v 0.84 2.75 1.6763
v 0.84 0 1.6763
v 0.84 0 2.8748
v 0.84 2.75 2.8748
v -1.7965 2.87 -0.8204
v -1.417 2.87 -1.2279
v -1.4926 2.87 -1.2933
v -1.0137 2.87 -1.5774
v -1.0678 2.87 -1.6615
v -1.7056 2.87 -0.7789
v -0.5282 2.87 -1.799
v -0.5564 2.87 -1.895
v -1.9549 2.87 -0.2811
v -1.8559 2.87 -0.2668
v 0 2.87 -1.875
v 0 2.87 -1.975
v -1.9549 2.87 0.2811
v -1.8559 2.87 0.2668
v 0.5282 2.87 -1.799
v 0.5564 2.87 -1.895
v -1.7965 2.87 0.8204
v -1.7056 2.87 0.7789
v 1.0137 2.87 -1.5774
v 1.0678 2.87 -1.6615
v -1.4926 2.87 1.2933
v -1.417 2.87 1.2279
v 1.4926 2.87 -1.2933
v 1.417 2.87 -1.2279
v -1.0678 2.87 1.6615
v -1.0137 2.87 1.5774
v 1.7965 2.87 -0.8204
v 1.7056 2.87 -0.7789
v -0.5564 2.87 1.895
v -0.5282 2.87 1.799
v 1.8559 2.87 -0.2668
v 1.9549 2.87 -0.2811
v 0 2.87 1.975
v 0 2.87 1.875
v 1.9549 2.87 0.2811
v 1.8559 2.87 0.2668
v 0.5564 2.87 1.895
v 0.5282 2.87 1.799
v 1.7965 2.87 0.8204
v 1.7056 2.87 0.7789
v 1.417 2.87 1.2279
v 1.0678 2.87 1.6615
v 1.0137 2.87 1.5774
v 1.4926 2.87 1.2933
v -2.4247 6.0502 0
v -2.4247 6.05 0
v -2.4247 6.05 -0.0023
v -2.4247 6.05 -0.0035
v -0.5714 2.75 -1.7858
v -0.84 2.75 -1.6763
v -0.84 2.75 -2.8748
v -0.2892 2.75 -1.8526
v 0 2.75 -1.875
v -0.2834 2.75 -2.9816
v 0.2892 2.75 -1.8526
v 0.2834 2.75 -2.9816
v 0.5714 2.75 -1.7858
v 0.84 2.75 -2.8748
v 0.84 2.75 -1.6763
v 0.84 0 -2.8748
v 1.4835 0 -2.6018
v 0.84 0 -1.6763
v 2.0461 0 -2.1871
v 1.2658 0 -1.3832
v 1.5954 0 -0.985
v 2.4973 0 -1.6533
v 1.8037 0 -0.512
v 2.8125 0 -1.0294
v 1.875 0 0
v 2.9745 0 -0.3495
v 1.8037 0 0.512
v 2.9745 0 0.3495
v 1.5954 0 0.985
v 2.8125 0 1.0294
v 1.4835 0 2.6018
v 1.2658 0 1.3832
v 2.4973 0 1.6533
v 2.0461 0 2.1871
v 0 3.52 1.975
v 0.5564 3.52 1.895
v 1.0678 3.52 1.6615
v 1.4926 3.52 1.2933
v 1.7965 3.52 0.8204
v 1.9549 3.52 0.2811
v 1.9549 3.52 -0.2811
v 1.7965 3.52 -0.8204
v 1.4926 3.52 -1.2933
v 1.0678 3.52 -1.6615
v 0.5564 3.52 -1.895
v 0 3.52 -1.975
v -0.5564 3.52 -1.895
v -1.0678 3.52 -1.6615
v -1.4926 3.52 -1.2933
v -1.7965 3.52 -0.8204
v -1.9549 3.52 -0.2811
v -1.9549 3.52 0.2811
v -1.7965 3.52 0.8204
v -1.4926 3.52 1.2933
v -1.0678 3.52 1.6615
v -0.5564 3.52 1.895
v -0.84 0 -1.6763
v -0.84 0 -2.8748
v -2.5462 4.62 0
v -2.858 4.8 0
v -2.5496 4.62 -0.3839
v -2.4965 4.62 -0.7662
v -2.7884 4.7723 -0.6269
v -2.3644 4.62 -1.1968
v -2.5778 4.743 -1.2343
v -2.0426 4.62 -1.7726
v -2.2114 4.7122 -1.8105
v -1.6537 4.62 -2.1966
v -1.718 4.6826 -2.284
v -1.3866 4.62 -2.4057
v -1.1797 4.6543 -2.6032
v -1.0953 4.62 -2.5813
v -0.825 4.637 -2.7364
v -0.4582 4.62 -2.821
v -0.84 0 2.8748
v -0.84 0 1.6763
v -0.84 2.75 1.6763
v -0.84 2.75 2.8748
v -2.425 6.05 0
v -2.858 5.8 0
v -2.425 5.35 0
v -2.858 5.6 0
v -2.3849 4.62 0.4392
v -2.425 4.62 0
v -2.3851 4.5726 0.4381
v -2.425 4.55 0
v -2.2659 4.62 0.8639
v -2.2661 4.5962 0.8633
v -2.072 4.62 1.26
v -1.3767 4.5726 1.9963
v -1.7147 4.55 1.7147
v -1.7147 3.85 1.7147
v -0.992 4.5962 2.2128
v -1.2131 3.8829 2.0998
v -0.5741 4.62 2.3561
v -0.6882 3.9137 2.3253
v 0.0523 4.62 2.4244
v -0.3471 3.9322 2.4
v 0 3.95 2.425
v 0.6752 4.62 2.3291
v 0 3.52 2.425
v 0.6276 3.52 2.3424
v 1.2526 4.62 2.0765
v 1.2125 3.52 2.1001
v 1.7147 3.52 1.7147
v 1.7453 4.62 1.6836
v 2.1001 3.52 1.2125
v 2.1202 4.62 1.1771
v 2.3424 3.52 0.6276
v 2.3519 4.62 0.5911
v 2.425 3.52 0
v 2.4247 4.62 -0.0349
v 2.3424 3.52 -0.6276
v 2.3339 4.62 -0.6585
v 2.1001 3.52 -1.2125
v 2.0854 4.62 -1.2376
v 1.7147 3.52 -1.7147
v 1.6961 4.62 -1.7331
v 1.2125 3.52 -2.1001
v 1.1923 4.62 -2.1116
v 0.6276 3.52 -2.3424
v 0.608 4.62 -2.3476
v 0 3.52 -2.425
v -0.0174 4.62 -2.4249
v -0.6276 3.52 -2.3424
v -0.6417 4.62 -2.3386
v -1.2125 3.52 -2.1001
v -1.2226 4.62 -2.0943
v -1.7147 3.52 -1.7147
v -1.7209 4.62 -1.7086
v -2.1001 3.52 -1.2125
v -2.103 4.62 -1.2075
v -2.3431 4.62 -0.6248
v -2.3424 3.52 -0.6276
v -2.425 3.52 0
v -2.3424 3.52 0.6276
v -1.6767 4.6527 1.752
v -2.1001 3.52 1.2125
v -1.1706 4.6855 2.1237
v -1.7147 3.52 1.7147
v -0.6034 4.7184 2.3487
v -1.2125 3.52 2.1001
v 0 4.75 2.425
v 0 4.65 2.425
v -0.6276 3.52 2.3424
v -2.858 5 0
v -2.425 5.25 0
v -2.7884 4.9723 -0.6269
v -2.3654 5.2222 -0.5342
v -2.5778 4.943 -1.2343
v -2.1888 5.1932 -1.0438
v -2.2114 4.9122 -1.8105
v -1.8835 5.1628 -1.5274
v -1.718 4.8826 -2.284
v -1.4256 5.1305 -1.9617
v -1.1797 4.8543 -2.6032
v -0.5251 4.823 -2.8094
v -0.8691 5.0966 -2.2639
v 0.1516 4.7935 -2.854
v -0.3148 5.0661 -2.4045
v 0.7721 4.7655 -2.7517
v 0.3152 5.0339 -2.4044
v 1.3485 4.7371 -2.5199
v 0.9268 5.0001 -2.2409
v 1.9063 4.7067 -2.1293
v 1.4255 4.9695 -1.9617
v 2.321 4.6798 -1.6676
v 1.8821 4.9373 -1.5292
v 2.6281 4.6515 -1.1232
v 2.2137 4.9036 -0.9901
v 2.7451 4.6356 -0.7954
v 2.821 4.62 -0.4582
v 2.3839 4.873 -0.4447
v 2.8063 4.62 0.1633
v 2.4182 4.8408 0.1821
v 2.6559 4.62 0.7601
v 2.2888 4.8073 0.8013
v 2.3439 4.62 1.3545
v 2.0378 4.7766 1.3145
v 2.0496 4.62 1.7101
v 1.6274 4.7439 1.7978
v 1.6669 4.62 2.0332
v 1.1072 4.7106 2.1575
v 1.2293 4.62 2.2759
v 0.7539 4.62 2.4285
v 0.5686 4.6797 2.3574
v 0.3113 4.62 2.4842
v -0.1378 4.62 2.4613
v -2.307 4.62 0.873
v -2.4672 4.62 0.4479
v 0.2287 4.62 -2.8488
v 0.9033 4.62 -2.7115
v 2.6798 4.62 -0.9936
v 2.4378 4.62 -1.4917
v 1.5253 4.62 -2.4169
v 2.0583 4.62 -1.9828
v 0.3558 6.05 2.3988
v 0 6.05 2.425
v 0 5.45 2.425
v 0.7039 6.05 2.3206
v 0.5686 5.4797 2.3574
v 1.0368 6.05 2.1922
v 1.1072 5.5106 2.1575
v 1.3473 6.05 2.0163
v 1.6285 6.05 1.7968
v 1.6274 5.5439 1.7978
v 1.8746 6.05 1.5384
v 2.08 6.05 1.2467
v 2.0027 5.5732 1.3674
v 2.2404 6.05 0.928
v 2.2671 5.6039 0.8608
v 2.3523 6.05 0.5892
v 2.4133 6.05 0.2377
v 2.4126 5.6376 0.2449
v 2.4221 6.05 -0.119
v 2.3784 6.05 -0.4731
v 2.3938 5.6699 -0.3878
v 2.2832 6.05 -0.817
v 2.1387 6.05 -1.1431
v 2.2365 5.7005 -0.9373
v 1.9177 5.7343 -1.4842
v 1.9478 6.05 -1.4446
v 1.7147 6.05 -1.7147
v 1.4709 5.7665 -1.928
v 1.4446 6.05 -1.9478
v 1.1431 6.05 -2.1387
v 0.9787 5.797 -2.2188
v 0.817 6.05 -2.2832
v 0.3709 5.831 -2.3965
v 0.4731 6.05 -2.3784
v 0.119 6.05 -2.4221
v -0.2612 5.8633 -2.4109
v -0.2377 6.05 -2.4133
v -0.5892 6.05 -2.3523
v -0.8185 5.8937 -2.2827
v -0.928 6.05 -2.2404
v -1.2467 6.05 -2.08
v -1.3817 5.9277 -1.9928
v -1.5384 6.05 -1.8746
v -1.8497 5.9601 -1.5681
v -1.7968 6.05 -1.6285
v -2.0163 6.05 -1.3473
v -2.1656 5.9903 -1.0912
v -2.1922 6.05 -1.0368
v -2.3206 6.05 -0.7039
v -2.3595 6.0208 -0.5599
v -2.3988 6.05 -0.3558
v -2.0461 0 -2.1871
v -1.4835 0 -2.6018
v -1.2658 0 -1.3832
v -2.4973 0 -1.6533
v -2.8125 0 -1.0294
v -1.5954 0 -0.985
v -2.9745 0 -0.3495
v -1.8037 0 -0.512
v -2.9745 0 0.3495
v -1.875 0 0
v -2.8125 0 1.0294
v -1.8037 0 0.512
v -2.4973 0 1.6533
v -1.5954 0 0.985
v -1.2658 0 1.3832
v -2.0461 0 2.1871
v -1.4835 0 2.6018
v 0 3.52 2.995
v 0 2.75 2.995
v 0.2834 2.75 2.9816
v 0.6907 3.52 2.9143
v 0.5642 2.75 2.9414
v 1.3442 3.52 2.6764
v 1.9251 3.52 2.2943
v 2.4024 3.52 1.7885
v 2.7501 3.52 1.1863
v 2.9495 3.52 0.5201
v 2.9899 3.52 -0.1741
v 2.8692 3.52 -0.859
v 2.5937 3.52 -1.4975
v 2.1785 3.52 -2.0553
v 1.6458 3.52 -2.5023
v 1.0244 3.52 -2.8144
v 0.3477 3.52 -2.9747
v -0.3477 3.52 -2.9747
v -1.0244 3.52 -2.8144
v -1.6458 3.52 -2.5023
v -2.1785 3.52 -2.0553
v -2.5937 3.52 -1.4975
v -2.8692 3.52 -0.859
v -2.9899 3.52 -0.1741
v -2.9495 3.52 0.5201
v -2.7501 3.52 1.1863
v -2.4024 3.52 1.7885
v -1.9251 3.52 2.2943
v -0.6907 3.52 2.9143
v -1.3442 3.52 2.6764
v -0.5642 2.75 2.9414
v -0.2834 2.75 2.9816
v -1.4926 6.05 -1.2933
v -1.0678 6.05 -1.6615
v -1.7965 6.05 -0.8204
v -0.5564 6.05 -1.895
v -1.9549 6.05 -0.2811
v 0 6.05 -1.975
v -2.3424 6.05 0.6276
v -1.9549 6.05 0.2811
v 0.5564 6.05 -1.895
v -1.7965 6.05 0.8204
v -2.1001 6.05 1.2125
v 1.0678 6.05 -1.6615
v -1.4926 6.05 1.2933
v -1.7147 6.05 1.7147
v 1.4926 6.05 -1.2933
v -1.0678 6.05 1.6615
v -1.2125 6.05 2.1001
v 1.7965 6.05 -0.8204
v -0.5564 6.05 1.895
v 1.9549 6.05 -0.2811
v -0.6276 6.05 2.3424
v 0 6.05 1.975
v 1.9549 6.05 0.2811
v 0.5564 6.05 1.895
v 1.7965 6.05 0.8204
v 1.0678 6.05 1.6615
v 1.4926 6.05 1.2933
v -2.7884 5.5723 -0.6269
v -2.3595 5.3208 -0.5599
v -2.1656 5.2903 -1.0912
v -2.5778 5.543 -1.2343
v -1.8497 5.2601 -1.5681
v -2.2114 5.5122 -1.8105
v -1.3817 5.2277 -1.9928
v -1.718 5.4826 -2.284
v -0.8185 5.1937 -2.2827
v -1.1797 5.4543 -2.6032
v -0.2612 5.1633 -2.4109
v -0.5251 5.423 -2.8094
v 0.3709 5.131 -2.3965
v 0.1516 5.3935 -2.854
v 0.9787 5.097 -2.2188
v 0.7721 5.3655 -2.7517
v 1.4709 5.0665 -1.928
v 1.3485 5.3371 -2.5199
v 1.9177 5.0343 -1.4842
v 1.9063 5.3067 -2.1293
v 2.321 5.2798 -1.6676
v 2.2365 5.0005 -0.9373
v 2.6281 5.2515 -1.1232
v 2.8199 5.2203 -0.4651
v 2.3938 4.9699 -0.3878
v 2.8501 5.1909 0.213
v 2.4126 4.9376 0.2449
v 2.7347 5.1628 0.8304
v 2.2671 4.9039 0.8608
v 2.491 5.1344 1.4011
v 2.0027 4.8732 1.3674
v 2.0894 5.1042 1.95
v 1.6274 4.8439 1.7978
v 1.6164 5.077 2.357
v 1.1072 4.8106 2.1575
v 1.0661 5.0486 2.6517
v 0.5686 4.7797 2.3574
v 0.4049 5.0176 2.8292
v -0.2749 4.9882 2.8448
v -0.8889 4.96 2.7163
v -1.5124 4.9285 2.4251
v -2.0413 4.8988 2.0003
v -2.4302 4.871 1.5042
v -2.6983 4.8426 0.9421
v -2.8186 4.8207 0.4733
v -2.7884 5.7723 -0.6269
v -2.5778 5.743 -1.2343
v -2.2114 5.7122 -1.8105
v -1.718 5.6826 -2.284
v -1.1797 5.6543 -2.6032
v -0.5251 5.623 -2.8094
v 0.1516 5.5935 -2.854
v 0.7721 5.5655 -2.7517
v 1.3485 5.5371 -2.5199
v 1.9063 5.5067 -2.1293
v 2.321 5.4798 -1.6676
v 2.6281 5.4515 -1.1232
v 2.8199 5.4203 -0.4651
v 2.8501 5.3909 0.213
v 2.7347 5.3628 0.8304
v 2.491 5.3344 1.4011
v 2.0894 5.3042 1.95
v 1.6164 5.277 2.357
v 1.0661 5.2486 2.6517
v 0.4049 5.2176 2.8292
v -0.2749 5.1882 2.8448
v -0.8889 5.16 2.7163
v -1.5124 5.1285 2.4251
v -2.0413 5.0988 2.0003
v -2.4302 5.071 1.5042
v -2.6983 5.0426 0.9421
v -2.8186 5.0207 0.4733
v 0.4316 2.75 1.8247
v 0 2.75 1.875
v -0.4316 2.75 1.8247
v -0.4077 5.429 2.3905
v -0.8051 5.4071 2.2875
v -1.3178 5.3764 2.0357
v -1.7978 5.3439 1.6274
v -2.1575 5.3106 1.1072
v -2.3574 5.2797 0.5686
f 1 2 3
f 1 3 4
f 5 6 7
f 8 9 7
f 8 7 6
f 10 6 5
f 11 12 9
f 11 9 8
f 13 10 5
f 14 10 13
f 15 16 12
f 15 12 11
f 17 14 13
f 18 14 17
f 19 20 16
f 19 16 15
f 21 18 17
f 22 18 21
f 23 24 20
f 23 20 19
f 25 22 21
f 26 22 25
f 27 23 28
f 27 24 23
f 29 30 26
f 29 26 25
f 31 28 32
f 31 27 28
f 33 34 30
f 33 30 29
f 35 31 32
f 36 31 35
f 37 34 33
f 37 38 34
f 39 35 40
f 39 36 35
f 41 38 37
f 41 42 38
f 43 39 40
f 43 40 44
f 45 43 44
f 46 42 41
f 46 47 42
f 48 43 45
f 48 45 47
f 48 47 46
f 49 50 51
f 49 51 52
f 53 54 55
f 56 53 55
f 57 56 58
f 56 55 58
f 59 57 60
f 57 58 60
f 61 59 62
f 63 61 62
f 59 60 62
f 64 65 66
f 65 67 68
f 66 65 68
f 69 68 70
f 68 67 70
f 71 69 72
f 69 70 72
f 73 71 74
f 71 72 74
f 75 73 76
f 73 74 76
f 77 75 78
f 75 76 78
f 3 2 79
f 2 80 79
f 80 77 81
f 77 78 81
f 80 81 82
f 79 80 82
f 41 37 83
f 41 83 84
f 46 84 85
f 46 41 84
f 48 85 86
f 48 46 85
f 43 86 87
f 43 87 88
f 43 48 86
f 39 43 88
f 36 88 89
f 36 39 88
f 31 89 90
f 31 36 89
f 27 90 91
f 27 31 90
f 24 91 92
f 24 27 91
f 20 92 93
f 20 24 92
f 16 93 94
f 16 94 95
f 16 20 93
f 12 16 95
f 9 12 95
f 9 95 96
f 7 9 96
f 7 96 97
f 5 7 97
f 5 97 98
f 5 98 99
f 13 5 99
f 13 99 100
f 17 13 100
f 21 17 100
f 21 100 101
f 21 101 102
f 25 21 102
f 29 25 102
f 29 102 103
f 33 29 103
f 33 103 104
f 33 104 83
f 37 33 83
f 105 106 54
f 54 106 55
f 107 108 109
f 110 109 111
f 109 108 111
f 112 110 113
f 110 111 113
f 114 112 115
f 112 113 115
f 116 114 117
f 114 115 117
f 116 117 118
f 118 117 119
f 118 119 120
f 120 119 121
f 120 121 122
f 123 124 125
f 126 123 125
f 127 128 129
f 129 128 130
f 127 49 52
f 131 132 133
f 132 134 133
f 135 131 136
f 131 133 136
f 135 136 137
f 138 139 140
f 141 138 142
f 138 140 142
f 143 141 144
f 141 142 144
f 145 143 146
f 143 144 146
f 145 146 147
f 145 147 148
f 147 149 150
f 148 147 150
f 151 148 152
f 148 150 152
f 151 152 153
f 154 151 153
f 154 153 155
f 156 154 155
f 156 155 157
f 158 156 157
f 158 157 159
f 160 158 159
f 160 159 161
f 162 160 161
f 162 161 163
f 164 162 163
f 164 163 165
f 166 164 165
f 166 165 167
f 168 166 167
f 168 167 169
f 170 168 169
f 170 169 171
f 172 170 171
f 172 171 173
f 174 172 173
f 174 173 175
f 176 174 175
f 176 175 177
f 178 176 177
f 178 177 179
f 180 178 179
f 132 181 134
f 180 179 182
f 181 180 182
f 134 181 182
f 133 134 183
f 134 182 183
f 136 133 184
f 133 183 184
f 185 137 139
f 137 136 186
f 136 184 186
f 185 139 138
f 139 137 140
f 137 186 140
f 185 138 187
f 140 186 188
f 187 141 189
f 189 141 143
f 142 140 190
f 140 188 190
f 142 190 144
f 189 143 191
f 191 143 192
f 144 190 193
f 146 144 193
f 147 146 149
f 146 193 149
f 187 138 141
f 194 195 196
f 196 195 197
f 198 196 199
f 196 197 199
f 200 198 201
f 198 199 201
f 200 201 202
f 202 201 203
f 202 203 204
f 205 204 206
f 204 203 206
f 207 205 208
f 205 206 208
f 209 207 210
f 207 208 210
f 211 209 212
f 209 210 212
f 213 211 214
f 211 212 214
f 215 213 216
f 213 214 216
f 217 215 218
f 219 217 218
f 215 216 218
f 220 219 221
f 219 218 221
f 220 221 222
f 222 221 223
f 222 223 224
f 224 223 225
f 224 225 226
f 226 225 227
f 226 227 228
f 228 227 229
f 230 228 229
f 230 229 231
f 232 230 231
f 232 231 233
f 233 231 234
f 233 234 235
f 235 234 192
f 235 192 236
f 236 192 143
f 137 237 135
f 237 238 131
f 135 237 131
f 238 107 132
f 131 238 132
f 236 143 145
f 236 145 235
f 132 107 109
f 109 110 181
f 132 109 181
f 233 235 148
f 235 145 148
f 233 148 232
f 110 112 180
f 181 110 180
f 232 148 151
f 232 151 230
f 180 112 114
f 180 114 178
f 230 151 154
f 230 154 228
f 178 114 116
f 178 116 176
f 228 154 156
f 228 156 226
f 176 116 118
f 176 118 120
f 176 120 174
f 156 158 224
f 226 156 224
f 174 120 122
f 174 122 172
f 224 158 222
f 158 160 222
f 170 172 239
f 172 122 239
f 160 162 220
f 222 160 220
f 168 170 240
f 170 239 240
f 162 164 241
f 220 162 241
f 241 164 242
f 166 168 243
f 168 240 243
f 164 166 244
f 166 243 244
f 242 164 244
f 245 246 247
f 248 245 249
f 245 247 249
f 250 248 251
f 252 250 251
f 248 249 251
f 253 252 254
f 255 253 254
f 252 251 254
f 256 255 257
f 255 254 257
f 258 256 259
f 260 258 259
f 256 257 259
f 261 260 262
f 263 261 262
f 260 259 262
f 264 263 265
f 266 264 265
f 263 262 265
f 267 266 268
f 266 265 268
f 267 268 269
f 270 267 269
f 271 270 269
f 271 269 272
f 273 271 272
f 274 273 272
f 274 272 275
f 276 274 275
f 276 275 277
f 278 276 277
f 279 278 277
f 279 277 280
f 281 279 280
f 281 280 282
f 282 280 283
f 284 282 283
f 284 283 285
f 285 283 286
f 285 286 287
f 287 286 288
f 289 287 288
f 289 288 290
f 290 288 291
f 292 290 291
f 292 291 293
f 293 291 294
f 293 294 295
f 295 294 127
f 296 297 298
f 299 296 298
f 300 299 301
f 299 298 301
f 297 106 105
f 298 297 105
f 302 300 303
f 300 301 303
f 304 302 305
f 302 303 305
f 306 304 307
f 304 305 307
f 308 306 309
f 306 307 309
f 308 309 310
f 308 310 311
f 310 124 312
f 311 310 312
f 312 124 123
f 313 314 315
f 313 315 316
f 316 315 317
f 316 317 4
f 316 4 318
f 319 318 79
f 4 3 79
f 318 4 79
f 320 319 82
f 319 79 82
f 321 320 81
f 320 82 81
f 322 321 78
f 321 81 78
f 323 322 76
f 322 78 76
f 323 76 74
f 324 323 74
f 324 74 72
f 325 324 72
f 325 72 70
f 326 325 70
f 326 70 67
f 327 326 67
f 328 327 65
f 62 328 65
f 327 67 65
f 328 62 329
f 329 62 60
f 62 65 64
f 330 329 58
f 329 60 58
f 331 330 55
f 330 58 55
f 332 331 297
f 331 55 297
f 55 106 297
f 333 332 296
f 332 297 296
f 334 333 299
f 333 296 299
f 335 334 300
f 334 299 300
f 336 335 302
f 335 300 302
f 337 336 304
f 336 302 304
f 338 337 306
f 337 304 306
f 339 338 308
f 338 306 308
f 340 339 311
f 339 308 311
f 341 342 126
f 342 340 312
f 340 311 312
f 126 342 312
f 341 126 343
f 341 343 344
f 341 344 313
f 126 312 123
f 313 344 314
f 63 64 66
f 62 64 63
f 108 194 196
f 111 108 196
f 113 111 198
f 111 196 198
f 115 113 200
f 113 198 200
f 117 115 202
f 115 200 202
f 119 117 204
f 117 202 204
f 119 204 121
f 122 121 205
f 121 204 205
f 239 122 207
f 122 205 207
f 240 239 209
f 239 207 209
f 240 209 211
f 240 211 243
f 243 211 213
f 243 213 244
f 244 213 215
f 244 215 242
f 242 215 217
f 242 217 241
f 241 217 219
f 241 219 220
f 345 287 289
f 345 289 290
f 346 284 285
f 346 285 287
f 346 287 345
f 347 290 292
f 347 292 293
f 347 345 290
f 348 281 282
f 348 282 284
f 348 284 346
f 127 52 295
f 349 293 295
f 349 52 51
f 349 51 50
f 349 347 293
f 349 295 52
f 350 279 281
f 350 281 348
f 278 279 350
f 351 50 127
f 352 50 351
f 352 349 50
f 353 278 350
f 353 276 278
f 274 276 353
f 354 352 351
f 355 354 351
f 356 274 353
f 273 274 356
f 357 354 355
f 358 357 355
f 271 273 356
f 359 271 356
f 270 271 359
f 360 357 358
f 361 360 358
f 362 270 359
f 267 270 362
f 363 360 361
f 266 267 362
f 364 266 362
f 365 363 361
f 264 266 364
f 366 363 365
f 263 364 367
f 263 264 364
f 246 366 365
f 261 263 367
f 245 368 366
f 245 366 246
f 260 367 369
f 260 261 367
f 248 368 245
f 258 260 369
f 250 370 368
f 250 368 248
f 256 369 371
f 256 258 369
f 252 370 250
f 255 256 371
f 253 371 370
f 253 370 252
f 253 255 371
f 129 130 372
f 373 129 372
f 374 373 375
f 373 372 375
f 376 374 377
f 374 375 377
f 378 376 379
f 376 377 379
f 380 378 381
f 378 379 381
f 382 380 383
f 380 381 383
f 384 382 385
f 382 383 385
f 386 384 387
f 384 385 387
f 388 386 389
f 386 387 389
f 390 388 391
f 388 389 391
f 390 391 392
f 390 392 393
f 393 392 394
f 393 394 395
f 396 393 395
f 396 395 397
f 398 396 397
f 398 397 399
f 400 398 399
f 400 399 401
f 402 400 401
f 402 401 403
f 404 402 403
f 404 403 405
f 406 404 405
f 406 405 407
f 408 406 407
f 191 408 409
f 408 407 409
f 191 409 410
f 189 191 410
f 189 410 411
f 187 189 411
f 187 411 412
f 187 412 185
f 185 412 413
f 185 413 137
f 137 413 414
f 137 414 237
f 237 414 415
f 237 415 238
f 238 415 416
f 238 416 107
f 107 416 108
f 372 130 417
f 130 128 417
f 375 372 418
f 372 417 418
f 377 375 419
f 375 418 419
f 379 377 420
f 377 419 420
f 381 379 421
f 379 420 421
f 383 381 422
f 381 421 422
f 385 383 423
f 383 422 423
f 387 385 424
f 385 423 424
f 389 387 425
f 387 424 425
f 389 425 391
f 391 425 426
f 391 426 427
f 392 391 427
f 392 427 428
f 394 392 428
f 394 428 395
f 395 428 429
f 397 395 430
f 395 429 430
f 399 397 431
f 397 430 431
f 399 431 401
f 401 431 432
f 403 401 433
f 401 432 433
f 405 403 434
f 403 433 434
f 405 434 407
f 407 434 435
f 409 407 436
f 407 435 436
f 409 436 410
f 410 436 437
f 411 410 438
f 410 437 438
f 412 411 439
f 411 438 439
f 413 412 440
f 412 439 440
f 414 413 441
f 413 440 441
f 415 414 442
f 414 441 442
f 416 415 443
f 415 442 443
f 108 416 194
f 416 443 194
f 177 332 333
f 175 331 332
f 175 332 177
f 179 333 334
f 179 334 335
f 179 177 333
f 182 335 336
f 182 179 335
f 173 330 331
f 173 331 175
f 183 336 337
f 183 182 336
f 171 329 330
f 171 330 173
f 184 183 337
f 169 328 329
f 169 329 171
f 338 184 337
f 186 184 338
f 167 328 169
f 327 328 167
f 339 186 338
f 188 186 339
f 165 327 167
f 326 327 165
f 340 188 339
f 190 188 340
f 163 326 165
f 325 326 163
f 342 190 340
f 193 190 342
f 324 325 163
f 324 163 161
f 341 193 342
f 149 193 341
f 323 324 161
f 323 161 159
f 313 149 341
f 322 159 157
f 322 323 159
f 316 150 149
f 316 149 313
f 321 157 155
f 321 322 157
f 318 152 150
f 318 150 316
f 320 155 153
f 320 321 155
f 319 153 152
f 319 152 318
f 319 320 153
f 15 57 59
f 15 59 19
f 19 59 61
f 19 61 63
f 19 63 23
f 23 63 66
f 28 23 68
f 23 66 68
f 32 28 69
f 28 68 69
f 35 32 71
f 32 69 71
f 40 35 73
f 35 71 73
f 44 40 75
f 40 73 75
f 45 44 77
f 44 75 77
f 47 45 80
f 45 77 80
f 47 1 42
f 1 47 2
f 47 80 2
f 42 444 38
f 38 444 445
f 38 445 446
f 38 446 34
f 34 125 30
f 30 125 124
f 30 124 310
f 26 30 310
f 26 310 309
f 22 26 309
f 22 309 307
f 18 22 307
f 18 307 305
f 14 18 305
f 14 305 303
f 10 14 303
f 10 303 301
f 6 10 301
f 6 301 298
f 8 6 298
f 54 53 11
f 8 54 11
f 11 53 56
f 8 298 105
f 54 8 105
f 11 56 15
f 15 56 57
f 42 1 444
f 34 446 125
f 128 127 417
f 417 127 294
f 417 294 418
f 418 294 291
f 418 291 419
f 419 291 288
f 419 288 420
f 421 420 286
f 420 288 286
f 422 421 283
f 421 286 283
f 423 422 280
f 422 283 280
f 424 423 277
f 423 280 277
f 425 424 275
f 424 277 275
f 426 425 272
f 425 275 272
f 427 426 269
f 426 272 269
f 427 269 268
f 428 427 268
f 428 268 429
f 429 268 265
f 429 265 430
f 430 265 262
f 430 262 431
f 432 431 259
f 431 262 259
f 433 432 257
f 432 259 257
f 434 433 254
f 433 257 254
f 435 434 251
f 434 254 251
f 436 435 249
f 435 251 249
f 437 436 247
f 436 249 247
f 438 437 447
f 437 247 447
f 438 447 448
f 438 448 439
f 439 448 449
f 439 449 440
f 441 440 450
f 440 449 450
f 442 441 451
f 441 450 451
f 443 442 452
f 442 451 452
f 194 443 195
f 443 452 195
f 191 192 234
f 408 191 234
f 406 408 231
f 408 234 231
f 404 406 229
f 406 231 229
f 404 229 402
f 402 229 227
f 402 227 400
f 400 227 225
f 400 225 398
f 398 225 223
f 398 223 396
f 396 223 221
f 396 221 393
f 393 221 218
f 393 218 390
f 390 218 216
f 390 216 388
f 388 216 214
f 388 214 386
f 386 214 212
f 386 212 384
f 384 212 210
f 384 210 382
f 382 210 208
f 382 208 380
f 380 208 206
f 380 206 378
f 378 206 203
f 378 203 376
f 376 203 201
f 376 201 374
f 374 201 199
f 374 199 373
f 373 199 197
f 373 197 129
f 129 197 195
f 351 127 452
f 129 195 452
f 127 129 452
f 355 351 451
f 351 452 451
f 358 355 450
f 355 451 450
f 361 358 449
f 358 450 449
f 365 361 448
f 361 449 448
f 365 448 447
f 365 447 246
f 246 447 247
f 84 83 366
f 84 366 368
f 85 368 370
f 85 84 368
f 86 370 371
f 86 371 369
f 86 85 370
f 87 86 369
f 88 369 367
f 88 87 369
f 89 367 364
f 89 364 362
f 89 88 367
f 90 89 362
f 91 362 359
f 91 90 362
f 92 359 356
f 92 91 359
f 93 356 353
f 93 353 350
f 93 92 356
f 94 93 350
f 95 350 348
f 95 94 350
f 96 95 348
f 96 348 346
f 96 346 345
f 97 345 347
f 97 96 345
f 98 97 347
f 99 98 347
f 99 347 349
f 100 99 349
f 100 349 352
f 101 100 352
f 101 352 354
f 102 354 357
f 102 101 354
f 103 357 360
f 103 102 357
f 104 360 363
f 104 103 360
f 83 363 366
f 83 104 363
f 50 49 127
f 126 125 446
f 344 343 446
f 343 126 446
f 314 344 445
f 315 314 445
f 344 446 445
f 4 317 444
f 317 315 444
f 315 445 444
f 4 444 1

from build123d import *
from build123d.topology import SkipClean

# Parameters (mm, degrees)
SKETCH1_R               = 2.995
BOSS_EXTRUDE1_DEPTH     = 3.52
SKETCH2_R               = 2.425
SKETCH2_R_2             = 1.975
BOSS_EXTRUDE2_DEPTH     = 2.53
THREAD1_PITCH           = 0.8
SKETCH6_R               = 3.05
SKETCH6_R_2             = 2.425
CUT_EXTRUDE1_DEPTH      = 1.1
SKETCH7_R               = 1.875
CUT_EXTRUDE2_DEPTH      = 3
CUT_EXTRUDE4_DEPTH      = 8.385434789
CUT_EXTRUDE4_DEPTH_BACK = 8.385434789
SKETCH9_W               = 1.68
SKETCH9_H               = 2.75
CUT_EXTRUDE6_START      = -3.18
SKETCH10_R              = 1.975
CUT_EXTRUDE6_DEPTH      = 3.18


with BuildPart() as part:
    # Sketch1 → Boss-Extrude1 (new body)
    with BuildSketch(Plane(origin=(0, 0, 0), x_dir=(1, 0, 0), z_dir=(0, 1, 0))):
        with Locations(Location((0, 0, 0), (0, 0, 270))):
            Circle(SKETCH1_R)
    extrude(amount=BOSS_EXTRUDE1_DEPTH)

    # Sketch2 → Boss-Extrude2 (add)
    with BuildSketch(Plane(origin=(0, 3.52, 0), x_dir=(1, 0, 0), z_dir=(0, 1, 0))):
        with Locations(Location((0, 0, 0), (0, 0, 270))):
            Circle(SKETCH2_R)
        with Locations(Location((0, 0, 0), (0, 0, 270))):
            Circle(SKETCH2_R_2, mode=Mode.SUBTRACT)
    extrude(amount=BOSS_EXTRUDE2_DEPTH)

    # Thread1: the profile of Thread Profile1 profile screwed along a right-hand helix of 1.875 turns, 8 arcs to a turn; built about Z, then put on its axis
    thread1_z = Axis((0, 0, 0), (0, 0, 1))
    thread1_corners = [(2.4247, 0, -0.000173205), (2.4247, 0, 0.700173203), (2.8580127, 0, 0.449999999), (2.8580127, 0, 0.249999999)]
    with BuildLine(mode=Mode.PRIVATE) as thread1_profile:
        Line(thread1_corners[0], thread1_corners[1])
        Line(thread1_corners[1], thread1_corners[2])
        Line(thread1_corners[2], thread1_corners[3])
        Line(thread1_corners[3], thread1_corners[0])
    thread1_cap = Face(thread1_profile.wire())
    thread1_turn_angles = [0, 22.5, 45, 67.5, 90, 112.5, 135, 157.5, 180, 202.5, 225, 247.5, 270, 292.5, 315, 337.5, 360]
    thread1_turn_weights = [1, 0.9238795325112867, 1, 0.9238795325112867, 1, 0.9238795325112867, 1, 0.9238795325112867, 1, 0.9238795325112867, 1, 0.9238795325112867, 1, 0.9238795325112867, 1, 0.9238795325112867, 1]
    thread1_turn_rails = [Edge.make_bspline([Vector(p[0], p[1], 0).rotate(thread1_z, thread1_turn_angles[k]) / thread1_turn_weights[k] + Vector(0, 0, p[2] + THREAD1_PITCH * thread1_turn_angles[k] / 360) for k in range(17)], [0, 0, 0, 1, 1, 2, 2, 3, 3, 4, 4, 5, 5, 6, 6, 7, 7, 8, 8, 8], 2, thread1_turn_weights) for p in thread1_corners]
    thread1_turn_sides = [Face.make_surface_from_curves(thread1_turn_rails[p[0]], thread1_turn_rails[p[1]]) for p in [(0, 1), (1, 2), (2, 3), (3, 0)]]
    thread1_last_angles = [360, 382.5, 405, 427.5, 450, 472.5, 495, 517.5, 540, 562.5, 585, 607.5, 630, 652.5, 675]
    thread1_last_weights = [1, 0.9238795325112867, 1, 0.9238795325112867, 1, 0.9238795325112867, 1, 0.9238795325112867, 1, 0.9238795325112867, 1, 0.9238795325112867, 1, 0.9238795325112867, 1]
    thread1_last_rails = [Edge.make_bspline([Vector(p[0], p[1], 0).rotate(thread1_z, thread1_last_angles[k]) / thread1_last_weights[k] + Vector(0, 0, p[2] + THREAD1_PITCH * thread1_last_angles[k] / 360) for k in range(15)], [0, 0, 0, 1, 1, 2, 2, 3, 3, 4, 4, 5, 5, 6, 6, 7, 7, 7], 2, thread1_last_weights) for p in thread1_corners]
    thread1_last_sides = [Face.make_surface_from_curves(thread1_last_rails[p[0]], thread1_last_rails[p[1]]) for p in [(0, 1), (1, 2), (2, 3), (3, 0)]]
    thread1 = Plane(origin=(0, 6.05, 0), x_dir=(-1, 0, 0), z_dir=(0, -1, 0)) * Solid(Shell([*thread1_turn_sides, *thread1_last_sides, thread1_cap, thread1_cap.rotate(thread1_z, 675).moved(Location((0, 0, THREAD1_PITCH * 675 / 360)))]))
    add(thread1)

    # Sketch6 → Cut-Extrude1 (cut)
    with BuildSketch(Plane(origin=(0, 3.52, 0), x_dir=(1, 0, 0), z_dir=(0, 1, 0))):
        Circle(SKETCH6_R)
        with Locations(Location((0, 0, 0), (0, 0, 180))):
            Circle(SKETCH6_R_2, mode=Mode.SUBTRACT)
    extrude(amount=CUT_EXTRUDE1_DEPTH, mode=Mode.SUBTRACT)

    # Sketch7 → Cut-Extrude2 (cut)
    with BuildSketch(Plane.XZ):
        with Locations(Location((0, 0, 0), (0, 0, 270))):
            Circle(SKETCH7_R)
    extrude(amount=-CUT_EXTRUDE2_DEPTH, mode=Mode.SUBTRACT)

    # Sketch9 → Cut-Extrude4 (cut, two sides: drawn at the far end of the back side and taken through both)
    with BuildSketch(Plane.XY.offset(-CUT_EXTRUDE4_DEPTH_BACK)):
        with Locations((0, 1.375)):
            Rectangle(SKETCH9_W, SKETCH9_H)
    extrude(amount=CUT_EXTRUDE4_DEPTH + CUT_EXTRUDE4_DEPTH_BACK, mode=Mode.SUBTRACT)

    # Sketch10 → Cut-Extrude6 (cut)
    with SkipClean():  # the faces are left unmerged after this step: merging them gives an invalid solid
        with BuildSketch(Plane(origin=(0, 6.05, 0), x_dir=(1, 0, 0), z_dir=(0, 1, 0)).offset(CUT_EXTRUDE6_START)):
            with Locations(Location((0, 0, 0), (0, 0, 270))):
                Circle(SKETCH10_R)
        extrude(amount=CUT_EXTRUDE6_DEPTH, mode=Mode.SUBTRACT)


solid = part.part
